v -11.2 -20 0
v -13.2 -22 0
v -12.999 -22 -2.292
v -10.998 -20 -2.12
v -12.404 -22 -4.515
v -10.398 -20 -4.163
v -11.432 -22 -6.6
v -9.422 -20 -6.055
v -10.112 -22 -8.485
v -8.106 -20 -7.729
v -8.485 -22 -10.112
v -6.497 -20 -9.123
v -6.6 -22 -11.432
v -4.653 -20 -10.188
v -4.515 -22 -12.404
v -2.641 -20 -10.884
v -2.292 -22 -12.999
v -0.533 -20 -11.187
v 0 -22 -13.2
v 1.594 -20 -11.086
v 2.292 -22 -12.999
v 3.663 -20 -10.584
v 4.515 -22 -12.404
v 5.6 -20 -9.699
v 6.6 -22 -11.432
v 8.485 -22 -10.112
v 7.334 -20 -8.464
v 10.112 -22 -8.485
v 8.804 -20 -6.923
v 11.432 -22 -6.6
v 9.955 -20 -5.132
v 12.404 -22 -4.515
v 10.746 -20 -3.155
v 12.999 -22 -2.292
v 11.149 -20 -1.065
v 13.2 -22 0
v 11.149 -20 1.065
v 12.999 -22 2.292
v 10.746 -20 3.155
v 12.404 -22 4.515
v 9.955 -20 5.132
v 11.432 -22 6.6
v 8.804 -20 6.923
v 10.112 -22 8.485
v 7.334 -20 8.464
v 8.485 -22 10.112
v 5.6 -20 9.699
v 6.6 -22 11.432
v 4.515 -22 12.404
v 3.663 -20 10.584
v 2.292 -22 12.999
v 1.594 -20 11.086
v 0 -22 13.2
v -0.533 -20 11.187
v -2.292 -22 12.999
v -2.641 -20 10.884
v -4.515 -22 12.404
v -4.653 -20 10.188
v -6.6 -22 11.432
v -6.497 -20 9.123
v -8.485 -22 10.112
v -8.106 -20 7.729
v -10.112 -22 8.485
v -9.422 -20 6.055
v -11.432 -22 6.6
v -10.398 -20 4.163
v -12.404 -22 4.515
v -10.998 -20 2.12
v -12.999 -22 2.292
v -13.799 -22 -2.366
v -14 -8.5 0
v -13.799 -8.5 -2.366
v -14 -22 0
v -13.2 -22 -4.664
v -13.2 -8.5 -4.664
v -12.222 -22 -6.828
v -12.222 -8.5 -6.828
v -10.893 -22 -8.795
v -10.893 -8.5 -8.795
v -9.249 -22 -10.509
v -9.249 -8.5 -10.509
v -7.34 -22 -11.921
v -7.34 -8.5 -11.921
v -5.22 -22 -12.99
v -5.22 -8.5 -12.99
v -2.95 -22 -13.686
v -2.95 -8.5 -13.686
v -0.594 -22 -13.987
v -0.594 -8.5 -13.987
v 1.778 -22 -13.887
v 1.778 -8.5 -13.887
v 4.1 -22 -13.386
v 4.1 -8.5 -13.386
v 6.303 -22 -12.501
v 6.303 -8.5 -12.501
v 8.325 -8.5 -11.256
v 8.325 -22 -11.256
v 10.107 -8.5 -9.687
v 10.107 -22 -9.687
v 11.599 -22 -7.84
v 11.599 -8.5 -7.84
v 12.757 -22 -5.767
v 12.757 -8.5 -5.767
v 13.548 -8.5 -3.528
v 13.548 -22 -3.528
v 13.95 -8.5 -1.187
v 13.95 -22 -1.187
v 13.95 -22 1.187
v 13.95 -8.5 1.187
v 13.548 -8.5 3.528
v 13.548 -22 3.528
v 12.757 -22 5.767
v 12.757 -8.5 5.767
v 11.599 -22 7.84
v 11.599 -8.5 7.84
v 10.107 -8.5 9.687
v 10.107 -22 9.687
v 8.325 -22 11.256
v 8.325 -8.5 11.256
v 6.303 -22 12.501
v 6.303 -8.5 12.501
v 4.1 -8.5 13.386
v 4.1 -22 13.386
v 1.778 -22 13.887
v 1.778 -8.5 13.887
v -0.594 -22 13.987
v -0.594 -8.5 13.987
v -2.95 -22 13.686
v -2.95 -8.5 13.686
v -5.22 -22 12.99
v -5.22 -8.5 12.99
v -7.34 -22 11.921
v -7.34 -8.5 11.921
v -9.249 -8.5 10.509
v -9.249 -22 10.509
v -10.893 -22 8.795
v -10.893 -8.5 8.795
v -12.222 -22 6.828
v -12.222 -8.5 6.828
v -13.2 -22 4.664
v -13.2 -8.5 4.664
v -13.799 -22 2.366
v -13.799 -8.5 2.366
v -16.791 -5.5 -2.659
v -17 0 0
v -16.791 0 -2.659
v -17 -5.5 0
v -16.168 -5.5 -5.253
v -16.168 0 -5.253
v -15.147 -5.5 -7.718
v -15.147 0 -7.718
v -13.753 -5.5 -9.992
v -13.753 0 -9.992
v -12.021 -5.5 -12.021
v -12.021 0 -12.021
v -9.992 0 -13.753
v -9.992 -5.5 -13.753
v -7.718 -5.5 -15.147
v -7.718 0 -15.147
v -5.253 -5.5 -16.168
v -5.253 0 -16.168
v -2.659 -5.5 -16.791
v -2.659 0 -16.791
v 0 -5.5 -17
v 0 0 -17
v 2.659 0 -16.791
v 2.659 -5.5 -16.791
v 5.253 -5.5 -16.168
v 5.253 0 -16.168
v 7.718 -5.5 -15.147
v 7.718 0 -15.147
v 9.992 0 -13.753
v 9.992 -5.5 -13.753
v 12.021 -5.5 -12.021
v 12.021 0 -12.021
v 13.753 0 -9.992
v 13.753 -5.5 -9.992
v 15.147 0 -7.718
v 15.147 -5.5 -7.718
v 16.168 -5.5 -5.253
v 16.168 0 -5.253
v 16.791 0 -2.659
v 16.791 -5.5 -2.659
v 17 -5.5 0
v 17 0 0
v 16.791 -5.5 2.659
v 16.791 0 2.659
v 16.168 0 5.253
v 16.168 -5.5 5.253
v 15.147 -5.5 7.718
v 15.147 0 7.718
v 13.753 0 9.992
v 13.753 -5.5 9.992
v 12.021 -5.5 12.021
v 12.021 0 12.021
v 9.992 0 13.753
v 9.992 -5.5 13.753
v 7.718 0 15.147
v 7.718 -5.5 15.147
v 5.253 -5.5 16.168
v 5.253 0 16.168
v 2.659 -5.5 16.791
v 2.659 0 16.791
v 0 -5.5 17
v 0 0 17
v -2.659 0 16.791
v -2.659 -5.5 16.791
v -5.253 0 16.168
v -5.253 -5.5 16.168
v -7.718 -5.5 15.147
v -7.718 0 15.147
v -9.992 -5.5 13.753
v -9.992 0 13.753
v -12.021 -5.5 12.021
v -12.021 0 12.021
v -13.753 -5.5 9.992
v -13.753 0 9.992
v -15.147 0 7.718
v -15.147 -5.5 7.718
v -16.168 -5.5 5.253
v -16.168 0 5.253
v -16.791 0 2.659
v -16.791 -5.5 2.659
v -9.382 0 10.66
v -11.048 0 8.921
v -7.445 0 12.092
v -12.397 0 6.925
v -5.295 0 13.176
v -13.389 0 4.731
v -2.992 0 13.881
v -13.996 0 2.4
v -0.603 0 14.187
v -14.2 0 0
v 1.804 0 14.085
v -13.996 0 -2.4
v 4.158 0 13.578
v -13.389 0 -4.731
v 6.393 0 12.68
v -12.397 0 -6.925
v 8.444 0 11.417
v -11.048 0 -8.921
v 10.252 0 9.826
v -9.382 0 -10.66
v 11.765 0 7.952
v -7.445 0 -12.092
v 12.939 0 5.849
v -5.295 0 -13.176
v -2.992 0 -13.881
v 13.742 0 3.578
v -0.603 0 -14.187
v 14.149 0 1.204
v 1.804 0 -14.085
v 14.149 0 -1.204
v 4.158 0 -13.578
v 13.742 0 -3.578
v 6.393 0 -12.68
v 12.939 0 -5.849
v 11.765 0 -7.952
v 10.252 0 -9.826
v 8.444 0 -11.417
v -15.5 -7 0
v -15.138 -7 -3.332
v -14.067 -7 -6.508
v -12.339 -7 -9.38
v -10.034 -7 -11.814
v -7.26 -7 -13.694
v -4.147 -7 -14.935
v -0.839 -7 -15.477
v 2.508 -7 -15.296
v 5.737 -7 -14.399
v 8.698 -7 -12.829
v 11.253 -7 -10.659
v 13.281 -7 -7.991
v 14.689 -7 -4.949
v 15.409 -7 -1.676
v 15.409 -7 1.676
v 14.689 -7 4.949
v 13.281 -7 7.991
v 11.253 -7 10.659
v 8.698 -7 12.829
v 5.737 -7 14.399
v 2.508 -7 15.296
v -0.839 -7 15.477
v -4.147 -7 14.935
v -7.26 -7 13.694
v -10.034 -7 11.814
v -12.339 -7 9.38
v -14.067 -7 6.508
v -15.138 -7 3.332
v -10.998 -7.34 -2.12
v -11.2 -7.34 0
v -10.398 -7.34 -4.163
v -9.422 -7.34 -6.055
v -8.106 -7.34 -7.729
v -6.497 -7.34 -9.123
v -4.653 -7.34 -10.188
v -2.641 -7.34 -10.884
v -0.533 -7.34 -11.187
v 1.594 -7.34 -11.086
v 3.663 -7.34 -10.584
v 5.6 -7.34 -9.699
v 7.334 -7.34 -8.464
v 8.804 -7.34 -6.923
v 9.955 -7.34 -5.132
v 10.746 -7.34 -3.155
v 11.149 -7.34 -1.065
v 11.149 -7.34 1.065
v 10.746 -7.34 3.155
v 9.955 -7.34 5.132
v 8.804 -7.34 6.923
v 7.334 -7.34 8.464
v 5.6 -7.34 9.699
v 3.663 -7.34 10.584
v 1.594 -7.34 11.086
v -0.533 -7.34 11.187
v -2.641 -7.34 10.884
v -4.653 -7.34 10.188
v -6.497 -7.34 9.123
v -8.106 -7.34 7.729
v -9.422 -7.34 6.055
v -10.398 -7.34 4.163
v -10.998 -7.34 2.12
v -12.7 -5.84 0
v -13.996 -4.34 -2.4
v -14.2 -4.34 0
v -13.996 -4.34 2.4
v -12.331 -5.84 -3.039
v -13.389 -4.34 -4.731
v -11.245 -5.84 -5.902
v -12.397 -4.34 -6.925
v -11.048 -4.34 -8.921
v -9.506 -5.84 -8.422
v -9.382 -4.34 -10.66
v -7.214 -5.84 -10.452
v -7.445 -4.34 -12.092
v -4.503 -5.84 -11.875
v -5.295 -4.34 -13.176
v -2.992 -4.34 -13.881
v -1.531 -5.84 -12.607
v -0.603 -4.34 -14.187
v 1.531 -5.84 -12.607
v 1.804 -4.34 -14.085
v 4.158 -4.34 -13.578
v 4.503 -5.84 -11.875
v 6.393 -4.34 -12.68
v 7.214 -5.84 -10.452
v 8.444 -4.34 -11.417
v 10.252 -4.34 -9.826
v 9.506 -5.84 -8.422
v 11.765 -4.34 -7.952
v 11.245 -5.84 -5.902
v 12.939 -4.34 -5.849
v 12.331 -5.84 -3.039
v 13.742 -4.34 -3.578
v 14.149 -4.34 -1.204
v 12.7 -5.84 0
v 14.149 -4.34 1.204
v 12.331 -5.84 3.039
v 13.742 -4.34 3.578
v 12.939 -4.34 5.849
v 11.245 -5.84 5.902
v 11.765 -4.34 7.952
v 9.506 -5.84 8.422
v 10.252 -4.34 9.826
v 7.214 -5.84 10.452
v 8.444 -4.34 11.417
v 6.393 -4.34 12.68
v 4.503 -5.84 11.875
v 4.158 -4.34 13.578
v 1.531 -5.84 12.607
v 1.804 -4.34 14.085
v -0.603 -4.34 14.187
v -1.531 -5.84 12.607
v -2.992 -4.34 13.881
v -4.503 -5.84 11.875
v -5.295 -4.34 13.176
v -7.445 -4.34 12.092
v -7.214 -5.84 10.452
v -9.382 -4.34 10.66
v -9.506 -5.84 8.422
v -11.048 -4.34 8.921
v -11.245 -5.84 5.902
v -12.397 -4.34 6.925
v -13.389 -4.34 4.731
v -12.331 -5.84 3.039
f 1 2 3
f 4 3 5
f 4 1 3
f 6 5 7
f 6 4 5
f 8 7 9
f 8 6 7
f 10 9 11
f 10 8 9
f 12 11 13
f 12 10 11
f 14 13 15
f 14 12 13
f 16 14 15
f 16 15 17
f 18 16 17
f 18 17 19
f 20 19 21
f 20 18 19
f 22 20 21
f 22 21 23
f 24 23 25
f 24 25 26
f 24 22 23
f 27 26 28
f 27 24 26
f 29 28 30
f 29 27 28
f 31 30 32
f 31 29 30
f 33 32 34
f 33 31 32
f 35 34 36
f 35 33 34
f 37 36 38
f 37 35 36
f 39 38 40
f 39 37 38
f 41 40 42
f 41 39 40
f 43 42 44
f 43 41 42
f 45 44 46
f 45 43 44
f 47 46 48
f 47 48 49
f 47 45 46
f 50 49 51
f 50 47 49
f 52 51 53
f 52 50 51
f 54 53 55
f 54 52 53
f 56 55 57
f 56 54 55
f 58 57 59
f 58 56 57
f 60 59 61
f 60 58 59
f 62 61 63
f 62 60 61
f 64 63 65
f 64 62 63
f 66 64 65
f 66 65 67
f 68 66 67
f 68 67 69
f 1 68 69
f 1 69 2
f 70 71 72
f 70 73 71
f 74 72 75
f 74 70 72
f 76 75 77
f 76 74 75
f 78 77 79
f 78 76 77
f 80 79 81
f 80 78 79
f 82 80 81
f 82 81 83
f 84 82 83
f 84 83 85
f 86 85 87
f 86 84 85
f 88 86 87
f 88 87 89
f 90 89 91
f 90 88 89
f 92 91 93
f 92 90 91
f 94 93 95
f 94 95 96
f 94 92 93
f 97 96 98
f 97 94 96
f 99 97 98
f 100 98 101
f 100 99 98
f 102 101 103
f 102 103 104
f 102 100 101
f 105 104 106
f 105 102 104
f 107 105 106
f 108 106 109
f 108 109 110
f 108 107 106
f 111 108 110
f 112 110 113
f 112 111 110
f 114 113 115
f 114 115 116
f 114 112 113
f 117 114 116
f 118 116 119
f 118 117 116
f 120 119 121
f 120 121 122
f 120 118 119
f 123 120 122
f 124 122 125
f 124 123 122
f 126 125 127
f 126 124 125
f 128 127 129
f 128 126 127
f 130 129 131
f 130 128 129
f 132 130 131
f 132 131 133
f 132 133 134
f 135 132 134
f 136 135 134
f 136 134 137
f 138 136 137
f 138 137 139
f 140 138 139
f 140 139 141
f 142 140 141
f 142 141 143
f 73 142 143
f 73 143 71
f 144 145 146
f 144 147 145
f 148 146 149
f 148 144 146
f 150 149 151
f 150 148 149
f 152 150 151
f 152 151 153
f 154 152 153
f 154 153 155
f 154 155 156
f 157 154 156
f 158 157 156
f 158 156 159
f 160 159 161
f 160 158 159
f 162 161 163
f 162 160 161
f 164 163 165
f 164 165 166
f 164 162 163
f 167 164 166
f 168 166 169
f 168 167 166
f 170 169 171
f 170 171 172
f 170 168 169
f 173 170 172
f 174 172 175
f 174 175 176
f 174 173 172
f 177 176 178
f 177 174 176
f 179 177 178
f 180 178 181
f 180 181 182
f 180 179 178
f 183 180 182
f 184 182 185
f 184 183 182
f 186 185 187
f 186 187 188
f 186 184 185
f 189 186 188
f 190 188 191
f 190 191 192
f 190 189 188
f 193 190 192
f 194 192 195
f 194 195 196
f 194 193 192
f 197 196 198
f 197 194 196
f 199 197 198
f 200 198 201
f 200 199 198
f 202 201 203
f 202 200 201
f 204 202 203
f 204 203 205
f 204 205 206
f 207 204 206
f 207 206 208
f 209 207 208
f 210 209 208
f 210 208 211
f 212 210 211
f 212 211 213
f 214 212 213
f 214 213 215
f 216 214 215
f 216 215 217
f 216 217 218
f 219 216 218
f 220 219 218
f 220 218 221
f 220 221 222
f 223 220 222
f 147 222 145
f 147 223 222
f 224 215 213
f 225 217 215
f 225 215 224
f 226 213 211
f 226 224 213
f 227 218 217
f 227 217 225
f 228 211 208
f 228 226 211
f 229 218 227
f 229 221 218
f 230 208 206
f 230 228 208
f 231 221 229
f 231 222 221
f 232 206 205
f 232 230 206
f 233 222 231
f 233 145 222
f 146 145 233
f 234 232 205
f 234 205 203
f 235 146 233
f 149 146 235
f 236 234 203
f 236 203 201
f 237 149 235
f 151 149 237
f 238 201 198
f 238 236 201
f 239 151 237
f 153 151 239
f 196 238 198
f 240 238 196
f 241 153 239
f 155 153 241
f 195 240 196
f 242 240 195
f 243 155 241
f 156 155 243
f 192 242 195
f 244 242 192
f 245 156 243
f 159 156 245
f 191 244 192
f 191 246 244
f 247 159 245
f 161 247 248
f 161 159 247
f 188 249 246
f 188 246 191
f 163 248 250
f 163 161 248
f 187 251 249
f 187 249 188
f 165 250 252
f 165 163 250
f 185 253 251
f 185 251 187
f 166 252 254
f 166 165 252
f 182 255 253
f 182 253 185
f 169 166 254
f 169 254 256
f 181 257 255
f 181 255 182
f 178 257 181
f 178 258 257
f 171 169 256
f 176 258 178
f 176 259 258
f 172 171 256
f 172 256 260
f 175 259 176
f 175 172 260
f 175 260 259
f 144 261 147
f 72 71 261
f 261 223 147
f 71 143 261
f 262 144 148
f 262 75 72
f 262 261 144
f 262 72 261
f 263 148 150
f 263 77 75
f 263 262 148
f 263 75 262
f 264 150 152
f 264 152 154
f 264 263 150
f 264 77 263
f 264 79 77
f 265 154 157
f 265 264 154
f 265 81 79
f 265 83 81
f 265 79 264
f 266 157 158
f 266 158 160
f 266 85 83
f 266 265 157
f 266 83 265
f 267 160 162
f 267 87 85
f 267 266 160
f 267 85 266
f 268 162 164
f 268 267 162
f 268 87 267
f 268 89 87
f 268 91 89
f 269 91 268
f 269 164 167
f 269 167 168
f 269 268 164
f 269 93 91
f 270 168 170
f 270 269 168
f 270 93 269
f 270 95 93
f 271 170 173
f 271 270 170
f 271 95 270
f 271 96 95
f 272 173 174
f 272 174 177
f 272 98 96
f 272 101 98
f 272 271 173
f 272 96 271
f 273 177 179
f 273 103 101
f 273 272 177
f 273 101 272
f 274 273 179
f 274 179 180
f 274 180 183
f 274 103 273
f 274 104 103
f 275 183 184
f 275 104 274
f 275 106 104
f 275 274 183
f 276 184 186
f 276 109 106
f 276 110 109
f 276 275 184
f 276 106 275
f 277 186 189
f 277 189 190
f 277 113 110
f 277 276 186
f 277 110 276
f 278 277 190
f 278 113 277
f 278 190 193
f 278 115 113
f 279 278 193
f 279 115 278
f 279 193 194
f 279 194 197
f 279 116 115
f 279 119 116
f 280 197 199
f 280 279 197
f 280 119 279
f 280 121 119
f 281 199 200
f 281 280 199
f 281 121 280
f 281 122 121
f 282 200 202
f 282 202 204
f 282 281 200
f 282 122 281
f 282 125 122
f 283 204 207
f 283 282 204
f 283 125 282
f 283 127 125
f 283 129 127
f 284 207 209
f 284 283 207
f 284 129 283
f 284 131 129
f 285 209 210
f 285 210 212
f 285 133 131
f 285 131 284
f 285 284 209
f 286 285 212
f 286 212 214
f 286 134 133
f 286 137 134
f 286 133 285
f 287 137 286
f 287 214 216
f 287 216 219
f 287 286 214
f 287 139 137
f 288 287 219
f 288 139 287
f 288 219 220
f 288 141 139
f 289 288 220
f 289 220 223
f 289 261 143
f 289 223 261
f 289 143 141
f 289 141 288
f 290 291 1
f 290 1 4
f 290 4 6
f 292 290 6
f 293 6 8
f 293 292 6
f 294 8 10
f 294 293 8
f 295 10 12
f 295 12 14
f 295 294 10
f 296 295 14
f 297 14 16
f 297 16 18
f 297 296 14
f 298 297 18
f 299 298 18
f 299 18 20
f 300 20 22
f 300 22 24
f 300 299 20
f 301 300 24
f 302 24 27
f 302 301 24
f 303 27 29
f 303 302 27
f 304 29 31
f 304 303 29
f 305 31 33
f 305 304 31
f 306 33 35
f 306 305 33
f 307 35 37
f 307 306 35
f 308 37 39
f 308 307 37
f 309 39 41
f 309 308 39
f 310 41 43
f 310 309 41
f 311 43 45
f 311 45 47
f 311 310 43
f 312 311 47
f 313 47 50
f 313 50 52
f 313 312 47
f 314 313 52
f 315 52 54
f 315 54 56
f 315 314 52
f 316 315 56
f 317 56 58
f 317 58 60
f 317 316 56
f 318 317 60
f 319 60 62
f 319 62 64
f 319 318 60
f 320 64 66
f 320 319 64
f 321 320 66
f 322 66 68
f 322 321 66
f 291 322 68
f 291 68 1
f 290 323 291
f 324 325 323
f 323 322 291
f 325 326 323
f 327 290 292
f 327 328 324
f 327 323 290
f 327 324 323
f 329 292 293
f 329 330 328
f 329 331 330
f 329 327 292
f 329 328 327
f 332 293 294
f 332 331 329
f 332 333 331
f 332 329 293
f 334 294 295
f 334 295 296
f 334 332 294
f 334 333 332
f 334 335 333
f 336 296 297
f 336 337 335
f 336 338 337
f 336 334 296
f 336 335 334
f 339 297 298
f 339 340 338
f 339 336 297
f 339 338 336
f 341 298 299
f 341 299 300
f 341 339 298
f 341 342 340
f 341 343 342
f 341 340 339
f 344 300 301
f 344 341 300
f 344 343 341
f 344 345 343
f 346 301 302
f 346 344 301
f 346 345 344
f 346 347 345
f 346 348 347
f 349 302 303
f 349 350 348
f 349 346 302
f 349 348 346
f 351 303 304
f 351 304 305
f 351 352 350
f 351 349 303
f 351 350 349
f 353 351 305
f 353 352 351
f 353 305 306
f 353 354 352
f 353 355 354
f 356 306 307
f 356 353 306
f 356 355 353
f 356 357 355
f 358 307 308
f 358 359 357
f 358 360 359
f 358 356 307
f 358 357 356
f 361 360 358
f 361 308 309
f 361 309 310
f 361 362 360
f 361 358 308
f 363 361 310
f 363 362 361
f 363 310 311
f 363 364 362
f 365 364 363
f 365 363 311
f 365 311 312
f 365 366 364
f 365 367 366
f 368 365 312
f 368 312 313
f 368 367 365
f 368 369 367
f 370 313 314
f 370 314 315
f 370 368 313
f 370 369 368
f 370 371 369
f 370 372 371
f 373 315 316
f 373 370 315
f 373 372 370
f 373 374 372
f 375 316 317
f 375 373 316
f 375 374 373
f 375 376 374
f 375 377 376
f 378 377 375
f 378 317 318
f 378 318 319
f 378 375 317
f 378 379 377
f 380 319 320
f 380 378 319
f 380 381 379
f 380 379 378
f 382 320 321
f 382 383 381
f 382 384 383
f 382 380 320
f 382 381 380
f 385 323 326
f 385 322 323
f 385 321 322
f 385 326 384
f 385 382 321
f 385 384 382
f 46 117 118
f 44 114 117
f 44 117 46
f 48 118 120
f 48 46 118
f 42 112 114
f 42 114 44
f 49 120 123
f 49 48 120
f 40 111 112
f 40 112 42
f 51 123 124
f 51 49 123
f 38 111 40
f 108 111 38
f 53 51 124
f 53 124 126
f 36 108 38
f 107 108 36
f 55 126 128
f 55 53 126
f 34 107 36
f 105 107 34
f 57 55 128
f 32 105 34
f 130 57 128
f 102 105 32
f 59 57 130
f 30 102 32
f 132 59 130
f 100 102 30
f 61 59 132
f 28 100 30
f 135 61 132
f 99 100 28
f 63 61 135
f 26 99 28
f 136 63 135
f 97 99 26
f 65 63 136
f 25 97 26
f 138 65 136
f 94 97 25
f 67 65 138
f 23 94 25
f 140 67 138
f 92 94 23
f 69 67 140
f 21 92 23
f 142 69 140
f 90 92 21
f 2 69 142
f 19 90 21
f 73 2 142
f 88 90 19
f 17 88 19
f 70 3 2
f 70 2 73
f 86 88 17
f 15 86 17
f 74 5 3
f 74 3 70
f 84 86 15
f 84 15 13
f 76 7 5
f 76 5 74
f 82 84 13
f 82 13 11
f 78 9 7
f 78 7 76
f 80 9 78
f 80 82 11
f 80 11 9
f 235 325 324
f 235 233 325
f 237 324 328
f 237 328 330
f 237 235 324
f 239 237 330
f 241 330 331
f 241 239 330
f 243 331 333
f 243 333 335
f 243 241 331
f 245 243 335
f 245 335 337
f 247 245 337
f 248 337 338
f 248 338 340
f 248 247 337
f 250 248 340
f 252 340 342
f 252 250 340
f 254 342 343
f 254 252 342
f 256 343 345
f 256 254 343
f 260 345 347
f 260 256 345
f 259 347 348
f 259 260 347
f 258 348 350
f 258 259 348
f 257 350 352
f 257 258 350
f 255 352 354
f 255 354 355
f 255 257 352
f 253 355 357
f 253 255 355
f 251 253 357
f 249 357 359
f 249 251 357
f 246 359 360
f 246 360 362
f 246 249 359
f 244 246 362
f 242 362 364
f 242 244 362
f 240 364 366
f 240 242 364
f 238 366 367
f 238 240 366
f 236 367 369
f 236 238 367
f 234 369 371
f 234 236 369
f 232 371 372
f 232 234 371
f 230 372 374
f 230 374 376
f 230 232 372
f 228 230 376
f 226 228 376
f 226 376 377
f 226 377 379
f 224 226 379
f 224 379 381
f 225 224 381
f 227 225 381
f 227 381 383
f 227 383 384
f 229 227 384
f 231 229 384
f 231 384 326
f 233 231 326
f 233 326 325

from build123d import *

# Parameters (mm, degrees)
CHAMFER1_SIZE = 2


with BuildPart() as part:
    # Sketch1 → Revolve1 (revolve)
    with BuildSketch(Plane.XY, mode=Mode.PRIVATE) as revolve1_sk:
        Polygon((17, 0), (17, -5.5), (14, -8.5), (14, -22), (11.2, -22), (11.2, -7.340202025), (14.2, -4.340202025), (14.2, 0), align=None)
    revolve(revolve1_sk.sketch.rotate(Axis((0, 16.279491968, 0), (0, -1, 0)), 180), axis=Axis((0, 16.279491968, 0), (0, -1, 0)))

    # Chamfer1
    chamfer1_edges = [part.edges().sort_by_distance(p)[0] for p in [
        (11.2, -22, 0),
    ]]
    chamfer(chamfer1_edges, length=CHAMFER1_SIZE)


solid = part.part
